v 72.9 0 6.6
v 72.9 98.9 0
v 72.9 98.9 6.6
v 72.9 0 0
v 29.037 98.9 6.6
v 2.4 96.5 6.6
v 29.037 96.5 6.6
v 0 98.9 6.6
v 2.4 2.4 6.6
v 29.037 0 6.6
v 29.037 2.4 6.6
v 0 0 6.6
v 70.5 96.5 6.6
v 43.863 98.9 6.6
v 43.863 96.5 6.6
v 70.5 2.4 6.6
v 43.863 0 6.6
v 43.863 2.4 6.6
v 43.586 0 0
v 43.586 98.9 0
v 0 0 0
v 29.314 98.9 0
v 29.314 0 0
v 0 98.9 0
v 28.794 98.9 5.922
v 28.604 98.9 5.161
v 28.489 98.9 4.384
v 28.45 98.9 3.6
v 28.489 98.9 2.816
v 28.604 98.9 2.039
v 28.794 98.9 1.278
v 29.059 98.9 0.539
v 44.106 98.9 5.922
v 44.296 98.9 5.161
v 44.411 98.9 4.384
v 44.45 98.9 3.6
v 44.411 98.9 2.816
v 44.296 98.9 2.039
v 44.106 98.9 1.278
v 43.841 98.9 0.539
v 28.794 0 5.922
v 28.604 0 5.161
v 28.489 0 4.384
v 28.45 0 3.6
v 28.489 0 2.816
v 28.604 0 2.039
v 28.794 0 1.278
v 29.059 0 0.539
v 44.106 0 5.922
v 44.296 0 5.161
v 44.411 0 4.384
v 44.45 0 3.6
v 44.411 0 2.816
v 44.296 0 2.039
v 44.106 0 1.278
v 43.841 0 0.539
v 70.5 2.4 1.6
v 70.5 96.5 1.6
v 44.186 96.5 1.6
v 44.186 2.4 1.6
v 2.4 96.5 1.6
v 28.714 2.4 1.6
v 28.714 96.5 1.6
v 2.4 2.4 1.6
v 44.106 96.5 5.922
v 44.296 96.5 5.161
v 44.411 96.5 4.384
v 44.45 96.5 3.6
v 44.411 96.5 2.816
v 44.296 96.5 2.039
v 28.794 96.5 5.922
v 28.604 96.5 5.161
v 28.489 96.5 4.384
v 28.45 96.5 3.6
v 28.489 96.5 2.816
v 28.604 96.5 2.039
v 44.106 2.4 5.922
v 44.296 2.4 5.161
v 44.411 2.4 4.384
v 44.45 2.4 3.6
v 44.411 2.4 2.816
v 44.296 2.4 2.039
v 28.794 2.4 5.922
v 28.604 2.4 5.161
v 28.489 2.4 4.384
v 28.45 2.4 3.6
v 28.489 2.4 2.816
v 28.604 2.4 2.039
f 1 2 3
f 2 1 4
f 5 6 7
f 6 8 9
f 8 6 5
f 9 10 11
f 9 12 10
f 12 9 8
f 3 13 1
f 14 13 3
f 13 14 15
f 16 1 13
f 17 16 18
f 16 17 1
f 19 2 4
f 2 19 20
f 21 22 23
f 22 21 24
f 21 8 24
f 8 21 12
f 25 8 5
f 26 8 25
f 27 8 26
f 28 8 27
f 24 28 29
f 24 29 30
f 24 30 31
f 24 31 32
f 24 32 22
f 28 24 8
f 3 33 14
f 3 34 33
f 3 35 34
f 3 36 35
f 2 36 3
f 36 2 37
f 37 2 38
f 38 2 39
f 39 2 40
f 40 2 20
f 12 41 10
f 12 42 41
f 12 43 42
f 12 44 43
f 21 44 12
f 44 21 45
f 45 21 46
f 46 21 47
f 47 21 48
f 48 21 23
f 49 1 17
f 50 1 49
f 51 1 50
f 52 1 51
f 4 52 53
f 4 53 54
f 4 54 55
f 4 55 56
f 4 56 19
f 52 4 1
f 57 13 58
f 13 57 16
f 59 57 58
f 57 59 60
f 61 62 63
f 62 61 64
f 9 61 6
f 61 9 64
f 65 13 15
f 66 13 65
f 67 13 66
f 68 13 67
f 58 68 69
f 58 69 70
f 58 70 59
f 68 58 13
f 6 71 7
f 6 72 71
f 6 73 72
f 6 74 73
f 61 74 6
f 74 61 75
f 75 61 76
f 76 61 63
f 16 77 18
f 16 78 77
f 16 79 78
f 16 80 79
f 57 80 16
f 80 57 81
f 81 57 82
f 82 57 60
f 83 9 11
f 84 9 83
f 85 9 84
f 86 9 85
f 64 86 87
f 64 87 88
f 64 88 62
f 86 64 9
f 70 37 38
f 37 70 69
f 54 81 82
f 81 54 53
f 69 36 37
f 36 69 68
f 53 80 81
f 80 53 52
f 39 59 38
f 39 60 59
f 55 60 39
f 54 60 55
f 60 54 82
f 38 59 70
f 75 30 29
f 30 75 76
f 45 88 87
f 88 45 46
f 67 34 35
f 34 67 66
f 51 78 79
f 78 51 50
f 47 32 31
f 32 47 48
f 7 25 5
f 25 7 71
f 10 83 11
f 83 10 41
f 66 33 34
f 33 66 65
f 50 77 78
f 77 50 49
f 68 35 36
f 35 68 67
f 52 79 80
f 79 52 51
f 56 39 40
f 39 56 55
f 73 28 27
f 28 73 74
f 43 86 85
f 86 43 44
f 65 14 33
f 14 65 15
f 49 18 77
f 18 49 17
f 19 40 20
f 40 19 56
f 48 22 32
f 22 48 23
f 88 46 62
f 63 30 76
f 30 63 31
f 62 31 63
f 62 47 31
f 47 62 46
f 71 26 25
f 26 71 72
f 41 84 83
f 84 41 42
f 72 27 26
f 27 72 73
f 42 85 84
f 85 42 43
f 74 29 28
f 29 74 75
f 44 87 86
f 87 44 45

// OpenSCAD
// Sleeving jig: puts every steel washer in the same place, the centre of the card's back, so the magnet finds it.
// The inner-sleeved card goes face-down into the tray; the bridge sits across the tray's walls; drop a washer through
// the bridge's hole, lift the bridge off, put a small piece of clear tape over the washer, then slide the outer sleeve
// on. Two prints (set `part`). Units: mm.

part     = "tray";    // "tray" or "bridge"
card_w   = 66.5;      // one inner sleeve; a little roomier than double-sleeved is fine
card_l   = 92.5;
clear    = 0.8;
wall     = 2.4;
floor_t  = 1.6;
wall_h   = 5;
washer_d = 11.1;      // #10 SAE washer OD (0.438"); the hole is a little bigger
bridge_w = 24;
$fn = 64;

iw = card_w + 2 * clear;
il = card_l + 2 * clear;

if (part == "tray") {
    difference() {
        cube([iw + 2 * wall, il + 2 * wall, floor_t + wall_h]);
        translate([wall, wall, floor_t]) cube([iw, il, wall_h + 1]);
        translate([(iw + 2 * wall) / 2, -1, floor_t + 2]) rotate([-90, 0, 0])    // thumb notches to lift the card
            cylinder(d = 16, h = il + 2 * wall + 2);
    }
} else {
    // across the tray's long walls, centred; two keys drop inside the walls so it can't slide
    W = iw + 2 * wall;
    difference() {
        union() {
            translate([0, -bridge_w / 2, 0]) cube([W, bridge_w, 2]);
            for (x = [wall + 0.2, W - wall - 0.2 - 2]) translate([x, -bridge_w / 2, -3]) cube([2, bridge_w, 3]);
        }
        translate([W / 2, 0, -5]) cylinder(d = washer_d + 0.8, h = 10);
    }
}
